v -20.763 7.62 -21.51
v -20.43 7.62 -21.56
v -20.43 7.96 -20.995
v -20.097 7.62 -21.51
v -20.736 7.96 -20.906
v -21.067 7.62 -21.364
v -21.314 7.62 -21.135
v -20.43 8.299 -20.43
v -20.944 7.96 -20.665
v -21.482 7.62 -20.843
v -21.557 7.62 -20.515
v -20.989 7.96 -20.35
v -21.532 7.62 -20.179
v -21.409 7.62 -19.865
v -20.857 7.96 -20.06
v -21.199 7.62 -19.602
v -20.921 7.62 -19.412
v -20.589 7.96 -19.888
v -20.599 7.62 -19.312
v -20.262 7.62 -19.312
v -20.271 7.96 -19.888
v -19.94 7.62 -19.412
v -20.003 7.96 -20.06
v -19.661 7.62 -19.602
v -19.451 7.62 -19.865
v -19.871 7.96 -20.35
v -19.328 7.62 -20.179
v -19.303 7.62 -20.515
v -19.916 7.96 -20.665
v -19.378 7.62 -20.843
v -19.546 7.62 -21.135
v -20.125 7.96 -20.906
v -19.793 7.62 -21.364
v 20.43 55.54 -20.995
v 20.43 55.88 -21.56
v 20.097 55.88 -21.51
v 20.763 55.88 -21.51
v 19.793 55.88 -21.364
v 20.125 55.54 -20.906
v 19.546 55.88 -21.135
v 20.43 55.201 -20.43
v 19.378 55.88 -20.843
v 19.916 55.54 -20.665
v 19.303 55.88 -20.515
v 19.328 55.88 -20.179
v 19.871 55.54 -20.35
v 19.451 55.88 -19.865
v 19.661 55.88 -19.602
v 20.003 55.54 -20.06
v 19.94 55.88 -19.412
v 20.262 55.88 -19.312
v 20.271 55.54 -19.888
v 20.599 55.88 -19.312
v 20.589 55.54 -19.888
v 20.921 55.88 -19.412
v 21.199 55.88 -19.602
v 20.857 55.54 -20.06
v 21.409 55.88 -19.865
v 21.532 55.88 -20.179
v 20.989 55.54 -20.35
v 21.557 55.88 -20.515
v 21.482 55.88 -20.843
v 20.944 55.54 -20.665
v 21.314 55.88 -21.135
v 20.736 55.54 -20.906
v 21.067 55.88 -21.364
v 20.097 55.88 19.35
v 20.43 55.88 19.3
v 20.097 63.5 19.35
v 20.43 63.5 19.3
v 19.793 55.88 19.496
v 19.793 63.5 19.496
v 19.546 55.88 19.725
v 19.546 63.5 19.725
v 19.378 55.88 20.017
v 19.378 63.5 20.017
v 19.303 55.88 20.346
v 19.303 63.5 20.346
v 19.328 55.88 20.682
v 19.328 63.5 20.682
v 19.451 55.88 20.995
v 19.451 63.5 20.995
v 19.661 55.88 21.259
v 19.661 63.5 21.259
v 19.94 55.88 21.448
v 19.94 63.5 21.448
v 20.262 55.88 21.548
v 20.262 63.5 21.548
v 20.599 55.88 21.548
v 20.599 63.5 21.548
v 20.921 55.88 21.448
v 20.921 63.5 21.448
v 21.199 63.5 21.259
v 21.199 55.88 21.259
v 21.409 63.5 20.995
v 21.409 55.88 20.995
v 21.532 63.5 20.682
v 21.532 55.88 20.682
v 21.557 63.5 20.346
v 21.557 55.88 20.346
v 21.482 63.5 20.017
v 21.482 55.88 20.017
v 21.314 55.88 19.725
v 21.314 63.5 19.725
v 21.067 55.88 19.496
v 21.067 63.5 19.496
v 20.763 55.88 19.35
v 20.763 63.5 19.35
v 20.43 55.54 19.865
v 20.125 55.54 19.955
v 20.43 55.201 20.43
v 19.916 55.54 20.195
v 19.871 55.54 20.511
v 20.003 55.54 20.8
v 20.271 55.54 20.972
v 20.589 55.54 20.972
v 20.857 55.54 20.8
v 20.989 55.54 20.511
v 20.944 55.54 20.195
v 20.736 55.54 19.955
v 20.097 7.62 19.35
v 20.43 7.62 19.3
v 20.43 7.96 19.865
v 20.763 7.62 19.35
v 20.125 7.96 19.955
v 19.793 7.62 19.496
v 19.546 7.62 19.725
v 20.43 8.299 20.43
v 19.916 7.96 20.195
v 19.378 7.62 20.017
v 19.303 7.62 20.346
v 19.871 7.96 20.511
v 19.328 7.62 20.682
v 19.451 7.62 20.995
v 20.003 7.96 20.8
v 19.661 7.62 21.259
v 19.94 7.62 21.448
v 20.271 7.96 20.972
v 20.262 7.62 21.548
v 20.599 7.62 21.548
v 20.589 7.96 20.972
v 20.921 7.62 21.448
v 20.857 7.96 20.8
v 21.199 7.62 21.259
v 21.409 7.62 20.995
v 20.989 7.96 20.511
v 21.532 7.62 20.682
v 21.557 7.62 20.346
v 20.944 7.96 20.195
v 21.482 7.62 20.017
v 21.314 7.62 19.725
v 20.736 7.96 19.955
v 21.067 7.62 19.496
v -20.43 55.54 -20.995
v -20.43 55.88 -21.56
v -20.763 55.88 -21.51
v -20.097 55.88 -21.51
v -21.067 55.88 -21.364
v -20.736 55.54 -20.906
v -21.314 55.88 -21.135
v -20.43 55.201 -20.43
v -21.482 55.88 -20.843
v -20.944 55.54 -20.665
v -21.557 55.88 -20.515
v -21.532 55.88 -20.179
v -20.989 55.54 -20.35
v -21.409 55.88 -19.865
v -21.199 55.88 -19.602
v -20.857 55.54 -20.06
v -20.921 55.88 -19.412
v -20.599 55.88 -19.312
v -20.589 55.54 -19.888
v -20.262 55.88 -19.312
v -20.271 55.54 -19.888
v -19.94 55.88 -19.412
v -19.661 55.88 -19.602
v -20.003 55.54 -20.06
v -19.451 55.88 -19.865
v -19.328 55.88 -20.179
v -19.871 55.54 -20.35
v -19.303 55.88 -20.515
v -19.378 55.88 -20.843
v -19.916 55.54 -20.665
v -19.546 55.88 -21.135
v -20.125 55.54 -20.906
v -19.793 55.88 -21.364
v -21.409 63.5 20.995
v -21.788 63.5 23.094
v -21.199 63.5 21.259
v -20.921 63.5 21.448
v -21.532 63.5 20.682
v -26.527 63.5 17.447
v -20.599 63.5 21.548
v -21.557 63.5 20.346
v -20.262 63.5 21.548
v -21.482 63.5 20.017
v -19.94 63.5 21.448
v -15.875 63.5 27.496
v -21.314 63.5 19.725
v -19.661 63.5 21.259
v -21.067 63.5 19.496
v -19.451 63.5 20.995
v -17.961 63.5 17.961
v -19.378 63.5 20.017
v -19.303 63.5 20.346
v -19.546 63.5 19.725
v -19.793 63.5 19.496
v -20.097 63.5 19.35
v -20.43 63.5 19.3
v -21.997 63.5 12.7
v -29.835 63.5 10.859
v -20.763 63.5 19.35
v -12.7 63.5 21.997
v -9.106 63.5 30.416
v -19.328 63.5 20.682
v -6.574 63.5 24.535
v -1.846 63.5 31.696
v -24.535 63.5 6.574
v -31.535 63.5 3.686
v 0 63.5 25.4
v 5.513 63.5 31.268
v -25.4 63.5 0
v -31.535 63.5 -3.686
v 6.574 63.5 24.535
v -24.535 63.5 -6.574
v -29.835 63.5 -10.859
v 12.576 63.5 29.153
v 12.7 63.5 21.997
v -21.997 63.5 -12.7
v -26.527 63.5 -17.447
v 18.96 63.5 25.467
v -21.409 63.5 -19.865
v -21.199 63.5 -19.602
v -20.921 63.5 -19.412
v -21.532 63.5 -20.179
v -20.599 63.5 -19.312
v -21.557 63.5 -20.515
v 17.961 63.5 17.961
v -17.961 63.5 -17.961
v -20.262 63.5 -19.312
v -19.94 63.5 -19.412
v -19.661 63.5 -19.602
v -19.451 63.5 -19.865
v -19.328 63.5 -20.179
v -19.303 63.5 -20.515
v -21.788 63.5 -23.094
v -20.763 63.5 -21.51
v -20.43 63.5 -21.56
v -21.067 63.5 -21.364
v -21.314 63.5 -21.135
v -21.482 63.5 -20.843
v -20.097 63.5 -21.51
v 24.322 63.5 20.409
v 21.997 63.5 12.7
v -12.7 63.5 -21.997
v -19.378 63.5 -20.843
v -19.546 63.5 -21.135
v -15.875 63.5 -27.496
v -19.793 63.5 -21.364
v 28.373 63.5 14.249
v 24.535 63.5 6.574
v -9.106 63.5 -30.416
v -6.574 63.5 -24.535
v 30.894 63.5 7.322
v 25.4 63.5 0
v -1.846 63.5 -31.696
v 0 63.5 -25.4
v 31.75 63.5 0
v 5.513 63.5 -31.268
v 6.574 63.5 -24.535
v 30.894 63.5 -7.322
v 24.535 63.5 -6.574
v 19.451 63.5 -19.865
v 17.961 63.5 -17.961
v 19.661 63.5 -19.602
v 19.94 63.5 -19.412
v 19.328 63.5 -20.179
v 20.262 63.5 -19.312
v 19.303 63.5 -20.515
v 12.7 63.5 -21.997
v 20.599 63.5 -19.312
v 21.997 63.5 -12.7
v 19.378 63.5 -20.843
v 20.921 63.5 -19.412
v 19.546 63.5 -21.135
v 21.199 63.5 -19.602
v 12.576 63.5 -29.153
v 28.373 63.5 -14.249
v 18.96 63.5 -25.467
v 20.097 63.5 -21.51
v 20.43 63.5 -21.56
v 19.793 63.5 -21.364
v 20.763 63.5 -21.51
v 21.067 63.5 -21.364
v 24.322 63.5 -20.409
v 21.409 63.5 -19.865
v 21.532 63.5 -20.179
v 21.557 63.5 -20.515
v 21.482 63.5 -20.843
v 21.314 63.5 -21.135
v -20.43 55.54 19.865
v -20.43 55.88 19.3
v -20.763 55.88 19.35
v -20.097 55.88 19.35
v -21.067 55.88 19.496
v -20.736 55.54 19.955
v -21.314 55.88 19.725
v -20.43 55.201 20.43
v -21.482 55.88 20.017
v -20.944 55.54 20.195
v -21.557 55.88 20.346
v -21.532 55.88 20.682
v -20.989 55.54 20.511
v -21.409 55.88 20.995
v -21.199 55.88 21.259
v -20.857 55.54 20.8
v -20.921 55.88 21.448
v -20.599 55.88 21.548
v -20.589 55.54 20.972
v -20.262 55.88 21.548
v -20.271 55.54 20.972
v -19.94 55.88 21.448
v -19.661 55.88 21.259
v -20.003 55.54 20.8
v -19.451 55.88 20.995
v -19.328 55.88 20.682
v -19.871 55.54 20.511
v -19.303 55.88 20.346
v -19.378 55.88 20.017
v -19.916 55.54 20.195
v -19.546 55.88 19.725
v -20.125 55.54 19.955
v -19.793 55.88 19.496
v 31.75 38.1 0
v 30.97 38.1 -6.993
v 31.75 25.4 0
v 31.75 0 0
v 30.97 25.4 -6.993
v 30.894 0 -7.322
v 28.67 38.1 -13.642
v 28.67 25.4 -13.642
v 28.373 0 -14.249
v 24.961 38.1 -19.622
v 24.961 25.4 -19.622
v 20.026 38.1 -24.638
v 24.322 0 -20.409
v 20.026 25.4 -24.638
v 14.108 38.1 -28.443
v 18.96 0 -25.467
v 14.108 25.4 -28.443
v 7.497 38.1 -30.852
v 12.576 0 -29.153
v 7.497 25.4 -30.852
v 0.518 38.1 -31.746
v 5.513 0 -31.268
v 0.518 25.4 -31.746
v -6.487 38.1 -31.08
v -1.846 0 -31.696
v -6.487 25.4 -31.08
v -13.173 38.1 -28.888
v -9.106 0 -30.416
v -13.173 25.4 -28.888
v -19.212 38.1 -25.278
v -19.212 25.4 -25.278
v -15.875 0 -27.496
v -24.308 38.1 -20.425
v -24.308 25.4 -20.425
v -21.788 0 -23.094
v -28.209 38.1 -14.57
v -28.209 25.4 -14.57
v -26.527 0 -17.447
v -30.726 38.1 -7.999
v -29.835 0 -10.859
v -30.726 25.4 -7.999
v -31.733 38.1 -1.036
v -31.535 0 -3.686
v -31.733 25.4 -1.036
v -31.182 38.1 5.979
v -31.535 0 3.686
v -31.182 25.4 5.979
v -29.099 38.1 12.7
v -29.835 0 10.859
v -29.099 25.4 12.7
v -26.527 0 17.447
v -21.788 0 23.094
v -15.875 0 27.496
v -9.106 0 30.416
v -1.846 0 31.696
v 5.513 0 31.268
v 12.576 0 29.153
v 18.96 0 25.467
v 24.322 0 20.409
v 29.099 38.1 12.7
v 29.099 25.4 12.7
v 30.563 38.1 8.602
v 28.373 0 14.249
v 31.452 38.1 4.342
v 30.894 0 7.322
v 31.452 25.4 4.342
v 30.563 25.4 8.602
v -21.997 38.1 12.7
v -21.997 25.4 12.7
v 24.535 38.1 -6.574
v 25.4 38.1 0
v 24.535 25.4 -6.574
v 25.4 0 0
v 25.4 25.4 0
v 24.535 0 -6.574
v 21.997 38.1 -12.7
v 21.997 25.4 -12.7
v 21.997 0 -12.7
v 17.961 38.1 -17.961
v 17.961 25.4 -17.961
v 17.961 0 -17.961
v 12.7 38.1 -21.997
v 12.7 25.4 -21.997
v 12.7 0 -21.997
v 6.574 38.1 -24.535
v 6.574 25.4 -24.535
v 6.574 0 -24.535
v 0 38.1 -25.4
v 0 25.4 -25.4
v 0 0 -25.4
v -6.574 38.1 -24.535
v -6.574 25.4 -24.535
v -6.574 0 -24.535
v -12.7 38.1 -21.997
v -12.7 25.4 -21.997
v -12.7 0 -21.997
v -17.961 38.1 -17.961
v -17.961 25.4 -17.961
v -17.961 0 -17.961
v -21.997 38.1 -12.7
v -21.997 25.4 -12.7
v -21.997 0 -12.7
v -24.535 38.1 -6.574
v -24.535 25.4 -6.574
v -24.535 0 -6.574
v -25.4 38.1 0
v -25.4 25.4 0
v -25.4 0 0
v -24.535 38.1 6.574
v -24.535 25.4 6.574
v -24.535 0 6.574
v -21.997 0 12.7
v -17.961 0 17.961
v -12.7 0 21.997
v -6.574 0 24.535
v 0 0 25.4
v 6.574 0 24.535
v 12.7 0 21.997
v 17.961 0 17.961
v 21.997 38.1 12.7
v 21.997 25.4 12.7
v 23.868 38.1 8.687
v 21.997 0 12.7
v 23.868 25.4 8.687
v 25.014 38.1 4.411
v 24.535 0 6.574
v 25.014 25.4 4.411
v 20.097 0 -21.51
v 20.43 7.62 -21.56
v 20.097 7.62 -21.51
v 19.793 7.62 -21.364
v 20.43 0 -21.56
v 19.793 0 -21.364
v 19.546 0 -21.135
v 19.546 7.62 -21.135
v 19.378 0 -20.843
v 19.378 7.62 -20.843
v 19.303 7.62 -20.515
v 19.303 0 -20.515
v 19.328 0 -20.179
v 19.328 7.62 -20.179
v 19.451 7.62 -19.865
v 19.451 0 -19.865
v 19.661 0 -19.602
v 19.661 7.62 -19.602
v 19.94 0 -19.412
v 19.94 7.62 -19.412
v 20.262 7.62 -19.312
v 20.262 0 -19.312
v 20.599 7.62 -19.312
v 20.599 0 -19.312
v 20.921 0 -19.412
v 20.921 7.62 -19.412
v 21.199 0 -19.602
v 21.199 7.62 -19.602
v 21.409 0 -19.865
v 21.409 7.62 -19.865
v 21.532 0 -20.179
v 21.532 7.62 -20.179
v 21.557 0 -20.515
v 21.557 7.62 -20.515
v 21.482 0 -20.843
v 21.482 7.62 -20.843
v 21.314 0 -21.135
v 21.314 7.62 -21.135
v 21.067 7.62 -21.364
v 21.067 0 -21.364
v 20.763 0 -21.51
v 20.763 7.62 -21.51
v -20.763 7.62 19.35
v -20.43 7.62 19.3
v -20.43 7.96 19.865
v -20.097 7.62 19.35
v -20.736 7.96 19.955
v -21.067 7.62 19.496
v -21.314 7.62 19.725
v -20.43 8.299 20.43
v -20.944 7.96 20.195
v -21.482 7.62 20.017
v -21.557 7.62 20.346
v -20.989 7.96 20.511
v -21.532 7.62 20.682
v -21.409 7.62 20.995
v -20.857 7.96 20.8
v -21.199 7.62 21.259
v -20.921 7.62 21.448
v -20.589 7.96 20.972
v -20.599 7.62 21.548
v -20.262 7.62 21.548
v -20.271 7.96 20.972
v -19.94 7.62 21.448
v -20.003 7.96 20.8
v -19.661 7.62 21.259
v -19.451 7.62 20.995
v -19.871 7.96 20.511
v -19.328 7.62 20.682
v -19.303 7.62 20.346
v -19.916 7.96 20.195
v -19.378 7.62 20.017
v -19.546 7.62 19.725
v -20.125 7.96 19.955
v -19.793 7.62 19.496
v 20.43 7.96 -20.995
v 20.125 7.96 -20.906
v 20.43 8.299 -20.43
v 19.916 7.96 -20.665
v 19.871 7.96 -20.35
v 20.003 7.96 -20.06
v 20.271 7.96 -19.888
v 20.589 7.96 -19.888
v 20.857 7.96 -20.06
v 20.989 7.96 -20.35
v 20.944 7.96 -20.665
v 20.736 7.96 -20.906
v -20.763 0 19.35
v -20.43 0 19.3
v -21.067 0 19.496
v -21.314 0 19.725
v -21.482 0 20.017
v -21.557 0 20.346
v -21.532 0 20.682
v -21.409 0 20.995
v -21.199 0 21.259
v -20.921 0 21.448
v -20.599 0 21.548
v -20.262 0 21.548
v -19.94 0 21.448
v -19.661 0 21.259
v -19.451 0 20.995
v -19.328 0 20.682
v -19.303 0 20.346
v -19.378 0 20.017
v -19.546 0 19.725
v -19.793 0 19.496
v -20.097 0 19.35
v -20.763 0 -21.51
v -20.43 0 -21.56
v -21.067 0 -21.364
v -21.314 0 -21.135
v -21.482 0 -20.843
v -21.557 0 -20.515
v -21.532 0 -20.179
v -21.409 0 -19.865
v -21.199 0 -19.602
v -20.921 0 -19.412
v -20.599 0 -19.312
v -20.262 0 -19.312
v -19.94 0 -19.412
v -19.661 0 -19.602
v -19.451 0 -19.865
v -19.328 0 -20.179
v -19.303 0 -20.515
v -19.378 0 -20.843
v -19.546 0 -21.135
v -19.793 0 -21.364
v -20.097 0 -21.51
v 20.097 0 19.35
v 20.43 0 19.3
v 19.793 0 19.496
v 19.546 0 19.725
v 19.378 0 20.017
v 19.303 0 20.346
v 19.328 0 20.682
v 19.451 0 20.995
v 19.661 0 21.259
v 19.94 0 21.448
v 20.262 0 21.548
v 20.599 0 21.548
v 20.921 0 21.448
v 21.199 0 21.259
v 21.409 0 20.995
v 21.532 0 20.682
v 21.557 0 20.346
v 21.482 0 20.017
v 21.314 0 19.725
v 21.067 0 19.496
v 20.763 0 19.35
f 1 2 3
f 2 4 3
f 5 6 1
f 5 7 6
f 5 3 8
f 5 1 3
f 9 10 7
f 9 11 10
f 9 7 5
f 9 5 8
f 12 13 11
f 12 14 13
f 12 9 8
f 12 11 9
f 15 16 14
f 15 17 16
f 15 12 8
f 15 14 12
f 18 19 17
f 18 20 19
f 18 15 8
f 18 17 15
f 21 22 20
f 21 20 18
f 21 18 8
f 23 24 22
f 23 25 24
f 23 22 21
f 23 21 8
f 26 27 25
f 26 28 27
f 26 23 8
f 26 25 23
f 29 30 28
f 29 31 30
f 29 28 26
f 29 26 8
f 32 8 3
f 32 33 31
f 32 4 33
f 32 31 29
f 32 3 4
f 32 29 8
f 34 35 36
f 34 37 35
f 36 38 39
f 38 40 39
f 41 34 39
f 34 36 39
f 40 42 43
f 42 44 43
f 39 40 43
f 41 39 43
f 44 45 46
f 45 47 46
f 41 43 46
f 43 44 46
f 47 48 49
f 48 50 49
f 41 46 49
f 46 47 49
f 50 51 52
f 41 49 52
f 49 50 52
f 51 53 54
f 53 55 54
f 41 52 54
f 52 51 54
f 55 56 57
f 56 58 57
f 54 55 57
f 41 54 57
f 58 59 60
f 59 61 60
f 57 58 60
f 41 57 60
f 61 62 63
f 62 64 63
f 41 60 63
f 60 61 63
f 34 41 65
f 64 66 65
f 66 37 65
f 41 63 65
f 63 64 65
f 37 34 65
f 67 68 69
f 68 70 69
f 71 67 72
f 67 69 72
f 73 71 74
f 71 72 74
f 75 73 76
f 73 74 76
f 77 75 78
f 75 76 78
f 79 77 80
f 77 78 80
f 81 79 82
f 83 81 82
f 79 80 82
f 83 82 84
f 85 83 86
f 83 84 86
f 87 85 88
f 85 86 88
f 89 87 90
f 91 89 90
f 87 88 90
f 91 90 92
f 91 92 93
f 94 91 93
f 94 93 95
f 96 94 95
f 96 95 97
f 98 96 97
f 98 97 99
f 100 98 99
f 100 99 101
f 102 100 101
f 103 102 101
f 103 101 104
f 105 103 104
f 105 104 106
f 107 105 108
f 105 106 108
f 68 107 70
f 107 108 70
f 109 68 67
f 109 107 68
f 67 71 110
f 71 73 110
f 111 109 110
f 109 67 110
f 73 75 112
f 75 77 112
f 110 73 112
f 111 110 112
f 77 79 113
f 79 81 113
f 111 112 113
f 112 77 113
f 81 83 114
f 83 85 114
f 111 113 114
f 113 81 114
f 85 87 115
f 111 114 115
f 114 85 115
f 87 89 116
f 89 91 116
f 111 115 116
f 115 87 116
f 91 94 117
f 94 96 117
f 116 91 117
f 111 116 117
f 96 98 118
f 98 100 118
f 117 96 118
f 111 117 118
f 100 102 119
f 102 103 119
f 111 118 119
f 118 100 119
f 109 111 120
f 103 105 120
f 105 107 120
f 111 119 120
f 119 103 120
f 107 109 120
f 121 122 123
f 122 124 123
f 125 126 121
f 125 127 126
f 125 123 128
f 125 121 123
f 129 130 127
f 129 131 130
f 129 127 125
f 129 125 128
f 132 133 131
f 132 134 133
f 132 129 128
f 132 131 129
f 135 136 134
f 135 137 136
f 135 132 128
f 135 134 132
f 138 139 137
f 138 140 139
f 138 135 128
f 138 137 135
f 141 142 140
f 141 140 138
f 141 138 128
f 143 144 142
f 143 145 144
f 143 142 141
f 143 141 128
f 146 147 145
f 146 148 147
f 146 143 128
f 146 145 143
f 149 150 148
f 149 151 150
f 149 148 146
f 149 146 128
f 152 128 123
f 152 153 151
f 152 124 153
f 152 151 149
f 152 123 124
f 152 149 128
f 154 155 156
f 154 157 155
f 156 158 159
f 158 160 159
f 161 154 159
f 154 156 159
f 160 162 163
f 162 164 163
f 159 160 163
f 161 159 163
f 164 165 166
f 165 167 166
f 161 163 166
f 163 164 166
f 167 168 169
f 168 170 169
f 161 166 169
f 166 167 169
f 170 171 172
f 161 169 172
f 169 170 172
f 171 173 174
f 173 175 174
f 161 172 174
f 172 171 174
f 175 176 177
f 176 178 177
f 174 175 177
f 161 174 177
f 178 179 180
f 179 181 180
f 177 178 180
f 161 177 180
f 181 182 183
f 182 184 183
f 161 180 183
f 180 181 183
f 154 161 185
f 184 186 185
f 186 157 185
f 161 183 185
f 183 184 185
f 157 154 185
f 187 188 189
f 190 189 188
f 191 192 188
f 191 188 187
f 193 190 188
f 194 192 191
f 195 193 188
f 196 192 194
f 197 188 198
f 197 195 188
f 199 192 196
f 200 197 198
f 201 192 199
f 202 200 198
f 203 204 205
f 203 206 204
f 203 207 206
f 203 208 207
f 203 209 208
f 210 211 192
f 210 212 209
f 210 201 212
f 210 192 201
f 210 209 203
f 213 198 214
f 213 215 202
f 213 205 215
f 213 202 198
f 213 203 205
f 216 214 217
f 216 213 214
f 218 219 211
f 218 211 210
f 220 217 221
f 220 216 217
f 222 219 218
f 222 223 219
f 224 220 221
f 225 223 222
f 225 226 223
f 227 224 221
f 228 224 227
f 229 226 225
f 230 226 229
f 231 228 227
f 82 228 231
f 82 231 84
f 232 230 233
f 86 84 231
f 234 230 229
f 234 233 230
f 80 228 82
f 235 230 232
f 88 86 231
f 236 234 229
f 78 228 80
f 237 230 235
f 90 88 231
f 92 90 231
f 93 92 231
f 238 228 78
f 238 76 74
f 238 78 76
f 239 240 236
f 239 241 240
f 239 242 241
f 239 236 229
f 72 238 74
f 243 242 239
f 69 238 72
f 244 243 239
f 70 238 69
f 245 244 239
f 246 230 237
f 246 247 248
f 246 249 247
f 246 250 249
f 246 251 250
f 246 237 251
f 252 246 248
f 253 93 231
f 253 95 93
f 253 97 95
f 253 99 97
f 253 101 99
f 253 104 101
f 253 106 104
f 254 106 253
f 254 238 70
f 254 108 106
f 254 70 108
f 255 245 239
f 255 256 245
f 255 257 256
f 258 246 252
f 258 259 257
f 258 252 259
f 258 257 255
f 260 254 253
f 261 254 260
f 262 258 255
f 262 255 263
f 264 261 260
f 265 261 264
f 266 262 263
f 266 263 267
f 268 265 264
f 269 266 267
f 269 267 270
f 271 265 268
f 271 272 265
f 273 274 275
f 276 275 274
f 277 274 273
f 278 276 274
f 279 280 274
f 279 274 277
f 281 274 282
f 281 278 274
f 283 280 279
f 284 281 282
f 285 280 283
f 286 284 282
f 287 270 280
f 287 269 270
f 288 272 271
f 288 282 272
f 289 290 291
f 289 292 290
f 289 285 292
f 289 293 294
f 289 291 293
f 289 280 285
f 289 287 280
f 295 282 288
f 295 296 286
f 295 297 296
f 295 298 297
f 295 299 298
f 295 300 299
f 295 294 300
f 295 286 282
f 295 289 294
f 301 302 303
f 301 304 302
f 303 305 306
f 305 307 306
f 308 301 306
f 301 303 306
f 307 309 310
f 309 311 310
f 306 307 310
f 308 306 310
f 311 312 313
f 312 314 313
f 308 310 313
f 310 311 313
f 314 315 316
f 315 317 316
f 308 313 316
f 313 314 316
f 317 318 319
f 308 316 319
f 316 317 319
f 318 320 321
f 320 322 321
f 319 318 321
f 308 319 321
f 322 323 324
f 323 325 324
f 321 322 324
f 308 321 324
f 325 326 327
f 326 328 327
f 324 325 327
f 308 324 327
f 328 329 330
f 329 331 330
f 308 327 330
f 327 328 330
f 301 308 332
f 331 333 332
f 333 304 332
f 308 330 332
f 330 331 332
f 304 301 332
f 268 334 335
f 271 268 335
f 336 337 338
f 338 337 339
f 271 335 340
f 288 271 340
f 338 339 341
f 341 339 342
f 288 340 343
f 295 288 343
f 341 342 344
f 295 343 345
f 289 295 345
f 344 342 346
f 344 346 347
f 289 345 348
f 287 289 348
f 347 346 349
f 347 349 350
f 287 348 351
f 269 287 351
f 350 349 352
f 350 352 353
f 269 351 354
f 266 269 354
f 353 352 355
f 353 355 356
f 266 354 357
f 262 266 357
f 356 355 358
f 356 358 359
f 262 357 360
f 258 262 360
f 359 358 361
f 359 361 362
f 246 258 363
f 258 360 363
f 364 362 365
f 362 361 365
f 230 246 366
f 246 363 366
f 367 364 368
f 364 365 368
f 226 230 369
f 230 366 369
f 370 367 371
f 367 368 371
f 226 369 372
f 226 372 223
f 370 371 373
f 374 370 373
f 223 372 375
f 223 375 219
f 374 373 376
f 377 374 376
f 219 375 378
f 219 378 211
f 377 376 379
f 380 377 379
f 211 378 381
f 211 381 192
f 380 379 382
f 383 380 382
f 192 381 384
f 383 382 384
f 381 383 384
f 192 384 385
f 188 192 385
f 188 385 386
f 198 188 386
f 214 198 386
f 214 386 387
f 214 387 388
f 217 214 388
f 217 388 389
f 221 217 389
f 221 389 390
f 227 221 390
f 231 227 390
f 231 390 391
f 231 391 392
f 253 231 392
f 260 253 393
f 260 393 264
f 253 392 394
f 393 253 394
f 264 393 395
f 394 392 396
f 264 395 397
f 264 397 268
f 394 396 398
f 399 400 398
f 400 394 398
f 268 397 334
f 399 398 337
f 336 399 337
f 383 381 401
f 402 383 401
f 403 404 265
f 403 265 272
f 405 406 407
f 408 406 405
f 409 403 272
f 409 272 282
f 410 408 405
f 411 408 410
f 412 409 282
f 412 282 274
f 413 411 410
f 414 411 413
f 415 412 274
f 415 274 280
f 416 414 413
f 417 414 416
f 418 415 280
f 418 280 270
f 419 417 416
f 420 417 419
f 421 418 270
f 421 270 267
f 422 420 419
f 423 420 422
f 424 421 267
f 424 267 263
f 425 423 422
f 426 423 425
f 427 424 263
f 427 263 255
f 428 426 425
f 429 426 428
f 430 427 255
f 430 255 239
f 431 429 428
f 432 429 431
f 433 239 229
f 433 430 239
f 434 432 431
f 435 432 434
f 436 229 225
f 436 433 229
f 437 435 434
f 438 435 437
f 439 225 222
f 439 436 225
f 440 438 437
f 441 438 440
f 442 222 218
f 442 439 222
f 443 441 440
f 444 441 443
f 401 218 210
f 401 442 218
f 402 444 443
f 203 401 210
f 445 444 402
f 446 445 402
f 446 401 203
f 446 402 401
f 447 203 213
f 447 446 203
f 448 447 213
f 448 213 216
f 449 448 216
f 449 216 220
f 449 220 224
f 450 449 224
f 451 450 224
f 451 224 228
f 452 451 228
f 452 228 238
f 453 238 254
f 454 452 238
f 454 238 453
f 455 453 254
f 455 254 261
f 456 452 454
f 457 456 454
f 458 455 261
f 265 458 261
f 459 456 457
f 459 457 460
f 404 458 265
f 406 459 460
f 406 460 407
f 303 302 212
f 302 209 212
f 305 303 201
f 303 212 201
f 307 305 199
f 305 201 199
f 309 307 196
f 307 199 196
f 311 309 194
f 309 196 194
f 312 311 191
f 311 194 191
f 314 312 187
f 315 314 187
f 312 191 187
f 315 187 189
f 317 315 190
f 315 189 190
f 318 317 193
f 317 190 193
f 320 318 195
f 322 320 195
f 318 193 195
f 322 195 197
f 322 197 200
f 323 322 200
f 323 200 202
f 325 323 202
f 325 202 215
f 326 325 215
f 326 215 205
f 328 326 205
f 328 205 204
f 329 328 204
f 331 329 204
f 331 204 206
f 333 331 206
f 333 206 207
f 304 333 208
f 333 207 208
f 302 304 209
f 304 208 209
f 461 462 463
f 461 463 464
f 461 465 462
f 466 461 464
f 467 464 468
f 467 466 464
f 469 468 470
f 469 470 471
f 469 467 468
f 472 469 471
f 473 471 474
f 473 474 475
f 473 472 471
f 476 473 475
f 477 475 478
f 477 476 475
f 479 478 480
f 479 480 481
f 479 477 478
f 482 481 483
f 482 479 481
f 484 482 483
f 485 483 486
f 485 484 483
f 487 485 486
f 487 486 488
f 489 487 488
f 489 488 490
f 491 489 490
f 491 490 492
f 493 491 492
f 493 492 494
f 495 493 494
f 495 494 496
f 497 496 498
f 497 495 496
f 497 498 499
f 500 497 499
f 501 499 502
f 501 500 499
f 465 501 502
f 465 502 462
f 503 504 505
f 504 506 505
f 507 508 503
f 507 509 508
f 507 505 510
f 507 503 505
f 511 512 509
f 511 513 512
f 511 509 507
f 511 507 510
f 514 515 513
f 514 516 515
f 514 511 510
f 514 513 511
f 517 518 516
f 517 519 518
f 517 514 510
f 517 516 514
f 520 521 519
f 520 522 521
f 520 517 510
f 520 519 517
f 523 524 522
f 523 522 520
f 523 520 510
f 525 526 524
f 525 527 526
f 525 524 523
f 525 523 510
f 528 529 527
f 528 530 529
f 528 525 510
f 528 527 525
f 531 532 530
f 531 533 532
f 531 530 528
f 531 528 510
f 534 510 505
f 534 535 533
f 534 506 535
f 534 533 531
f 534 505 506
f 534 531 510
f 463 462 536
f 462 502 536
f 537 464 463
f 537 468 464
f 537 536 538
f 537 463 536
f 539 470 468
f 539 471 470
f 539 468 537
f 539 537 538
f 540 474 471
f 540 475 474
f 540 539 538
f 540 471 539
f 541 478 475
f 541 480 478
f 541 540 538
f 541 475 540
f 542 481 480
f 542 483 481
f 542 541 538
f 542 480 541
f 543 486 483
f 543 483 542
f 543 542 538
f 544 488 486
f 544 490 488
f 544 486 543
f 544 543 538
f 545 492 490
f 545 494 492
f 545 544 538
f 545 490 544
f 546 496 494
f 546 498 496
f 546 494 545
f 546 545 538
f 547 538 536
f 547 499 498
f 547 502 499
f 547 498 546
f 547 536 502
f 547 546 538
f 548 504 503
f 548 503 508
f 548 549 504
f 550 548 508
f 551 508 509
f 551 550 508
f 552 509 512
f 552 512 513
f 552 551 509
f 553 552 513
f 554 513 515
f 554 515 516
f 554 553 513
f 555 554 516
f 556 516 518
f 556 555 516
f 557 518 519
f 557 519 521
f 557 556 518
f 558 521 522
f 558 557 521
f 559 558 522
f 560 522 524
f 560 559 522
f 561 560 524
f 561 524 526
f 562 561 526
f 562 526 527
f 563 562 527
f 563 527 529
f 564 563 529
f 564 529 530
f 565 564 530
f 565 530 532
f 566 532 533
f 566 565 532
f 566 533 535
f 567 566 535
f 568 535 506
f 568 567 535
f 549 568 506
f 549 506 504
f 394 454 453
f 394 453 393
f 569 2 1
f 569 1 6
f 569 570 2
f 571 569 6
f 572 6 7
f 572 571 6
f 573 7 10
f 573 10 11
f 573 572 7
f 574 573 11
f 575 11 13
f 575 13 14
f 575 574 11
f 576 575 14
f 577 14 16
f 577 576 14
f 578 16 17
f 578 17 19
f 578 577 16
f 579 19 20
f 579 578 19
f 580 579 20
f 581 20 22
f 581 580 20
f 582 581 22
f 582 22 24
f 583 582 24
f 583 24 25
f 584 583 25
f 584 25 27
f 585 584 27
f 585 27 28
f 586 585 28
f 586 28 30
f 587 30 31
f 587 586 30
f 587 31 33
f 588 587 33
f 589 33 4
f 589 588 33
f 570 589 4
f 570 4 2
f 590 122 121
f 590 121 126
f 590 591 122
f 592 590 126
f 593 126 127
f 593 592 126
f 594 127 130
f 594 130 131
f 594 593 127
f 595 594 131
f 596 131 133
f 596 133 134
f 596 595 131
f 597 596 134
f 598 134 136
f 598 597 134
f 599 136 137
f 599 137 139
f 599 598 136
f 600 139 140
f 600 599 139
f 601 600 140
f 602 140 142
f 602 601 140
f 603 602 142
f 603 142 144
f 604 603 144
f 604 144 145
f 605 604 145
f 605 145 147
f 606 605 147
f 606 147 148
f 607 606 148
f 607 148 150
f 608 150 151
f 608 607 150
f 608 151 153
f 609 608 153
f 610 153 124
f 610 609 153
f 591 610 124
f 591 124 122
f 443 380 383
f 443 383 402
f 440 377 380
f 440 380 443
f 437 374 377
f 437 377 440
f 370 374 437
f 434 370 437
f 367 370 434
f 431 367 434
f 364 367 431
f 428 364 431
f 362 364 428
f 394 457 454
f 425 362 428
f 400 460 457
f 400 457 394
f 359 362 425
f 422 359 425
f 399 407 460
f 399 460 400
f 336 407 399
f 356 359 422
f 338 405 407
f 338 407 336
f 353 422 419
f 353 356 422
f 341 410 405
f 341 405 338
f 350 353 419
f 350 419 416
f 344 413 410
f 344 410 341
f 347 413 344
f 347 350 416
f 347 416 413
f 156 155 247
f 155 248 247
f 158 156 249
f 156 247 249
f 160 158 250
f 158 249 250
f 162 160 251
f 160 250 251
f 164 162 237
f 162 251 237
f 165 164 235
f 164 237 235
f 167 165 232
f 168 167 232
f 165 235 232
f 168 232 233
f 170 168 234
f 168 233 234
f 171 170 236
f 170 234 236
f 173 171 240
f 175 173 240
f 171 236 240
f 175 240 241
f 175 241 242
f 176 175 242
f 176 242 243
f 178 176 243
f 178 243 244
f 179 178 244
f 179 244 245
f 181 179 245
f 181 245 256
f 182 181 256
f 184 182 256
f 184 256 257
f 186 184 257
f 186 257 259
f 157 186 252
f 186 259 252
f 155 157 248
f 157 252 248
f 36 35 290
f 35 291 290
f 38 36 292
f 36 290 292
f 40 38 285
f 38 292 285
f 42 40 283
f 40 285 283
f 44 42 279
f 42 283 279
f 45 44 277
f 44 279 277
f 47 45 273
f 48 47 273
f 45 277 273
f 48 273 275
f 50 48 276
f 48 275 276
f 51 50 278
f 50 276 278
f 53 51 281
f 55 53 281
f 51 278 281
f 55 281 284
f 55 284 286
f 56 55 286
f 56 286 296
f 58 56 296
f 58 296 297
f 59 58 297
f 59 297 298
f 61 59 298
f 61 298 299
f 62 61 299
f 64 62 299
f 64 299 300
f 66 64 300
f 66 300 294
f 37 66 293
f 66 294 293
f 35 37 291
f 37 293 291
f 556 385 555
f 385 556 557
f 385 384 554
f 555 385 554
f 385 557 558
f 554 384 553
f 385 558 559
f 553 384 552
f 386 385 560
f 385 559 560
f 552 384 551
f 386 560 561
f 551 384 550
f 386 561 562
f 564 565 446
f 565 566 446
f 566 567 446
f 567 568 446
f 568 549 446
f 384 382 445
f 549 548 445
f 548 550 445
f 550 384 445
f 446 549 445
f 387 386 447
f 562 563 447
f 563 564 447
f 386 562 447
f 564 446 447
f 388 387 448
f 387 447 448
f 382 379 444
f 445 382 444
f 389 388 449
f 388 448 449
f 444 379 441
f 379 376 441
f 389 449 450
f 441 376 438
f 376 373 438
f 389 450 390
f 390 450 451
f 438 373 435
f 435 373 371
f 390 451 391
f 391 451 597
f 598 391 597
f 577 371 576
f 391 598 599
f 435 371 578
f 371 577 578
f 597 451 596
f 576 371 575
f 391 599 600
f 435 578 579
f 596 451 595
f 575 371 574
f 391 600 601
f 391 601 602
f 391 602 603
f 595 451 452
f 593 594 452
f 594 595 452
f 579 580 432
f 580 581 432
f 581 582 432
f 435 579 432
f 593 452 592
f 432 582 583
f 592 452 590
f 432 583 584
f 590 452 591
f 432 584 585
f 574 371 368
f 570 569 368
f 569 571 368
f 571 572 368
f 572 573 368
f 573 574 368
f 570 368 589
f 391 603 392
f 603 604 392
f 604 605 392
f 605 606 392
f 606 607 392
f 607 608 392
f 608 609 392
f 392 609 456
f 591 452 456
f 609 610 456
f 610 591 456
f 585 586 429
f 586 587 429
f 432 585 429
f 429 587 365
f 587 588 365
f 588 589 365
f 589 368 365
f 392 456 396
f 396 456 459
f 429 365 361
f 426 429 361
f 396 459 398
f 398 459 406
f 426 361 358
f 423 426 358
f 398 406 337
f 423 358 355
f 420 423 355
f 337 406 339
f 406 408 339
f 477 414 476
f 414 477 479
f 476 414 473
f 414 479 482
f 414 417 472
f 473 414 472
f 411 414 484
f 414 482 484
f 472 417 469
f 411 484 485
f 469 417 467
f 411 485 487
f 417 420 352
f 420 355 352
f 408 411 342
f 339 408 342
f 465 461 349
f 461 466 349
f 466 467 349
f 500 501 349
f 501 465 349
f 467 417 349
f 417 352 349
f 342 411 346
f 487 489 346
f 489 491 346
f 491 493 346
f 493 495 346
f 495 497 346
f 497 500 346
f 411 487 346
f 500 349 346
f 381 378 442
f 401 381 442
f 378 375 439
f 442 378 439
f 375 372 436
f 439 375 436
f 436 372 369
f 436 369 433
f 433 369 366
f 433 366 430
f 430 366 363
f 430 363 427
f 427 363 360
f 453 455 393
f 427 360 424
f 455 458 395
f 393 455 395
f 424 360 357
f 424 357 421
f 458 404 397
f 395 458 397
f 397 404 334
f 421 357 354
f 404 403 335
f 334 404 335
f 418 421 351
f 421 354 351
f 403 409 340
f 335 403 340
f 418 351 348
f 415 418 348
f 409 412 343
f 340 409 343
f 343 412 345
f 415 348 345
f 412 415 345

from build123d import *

# Parameters (mm, degrees)
SKETCH1_R                      = 31.75
SKETCH1_R_2                    = 25.4
BOSS_EXTRUDE1_DEPTH            = 63.5
F_4_40_TAPPED_HOLE1_AT_2_COUNT = 2
F_4_40_TAPPED_HOLE1_AT_2_PITCH = 40.860165351
F_4_40_TAPPED_HOLE1_AT_3_COUNT = 2
F_4_40_TAPPED_HOLE1_AT_3_PITCH = 57.785
F_4_40_TAPPED_HOLE1_AT_4_COUNT = 2
F_4_40_TAPPED_HOLE1_AT_4_PITCH = 40.860165351
SKETCH4_W                      = 112.670227293
SKETCH4_H                      = 56.447090519
CUT_EXTRUDE1_DEPTH             = 12.7


with BuildPart() as part:
    # Sketch1 → Boss-Extrude1 (new body)
    with BuildSketch(Plane(origin=(0, 0, 0), x_dir=(1, 0, 0), z_dir=(0, 1, 0))):
        Circle(SKETCH1_R)
        Circle(SKETCH1_R_2, mode=Mode.SUBTRACT)
    extrude(amount=BOSS_EXTRUDE1_DEPTH)

    # Sketch2 → #4-40 Tapped Hole1 (revolve, cut)
    with BuildSketch(Plane(origin=(-20.430082675, 0, 20.430082675), x_dir=(0, 0, -1), z_dir=(1, 0, 0))):
        Polygon((0, 0), (0, 8.299152758), (1.1303, 7.62), (1.1303, 0), align=None)
    f_4_40_tapped_hole1 = revolve(axis=Axis((-20.430082675, -6.35, 20.430082675), (0, 1, 0)), mode=Mode.SUBTRACT)

    # #4-40 Tapped Hole1 at 2: #4-40 Tapped Hole1 ×2
    with Locations(*[(i * F_4_40_TAPPED_HOLE1_AT_2_PITCH, 0, 0) for i in range(1, F_4_40_TAPPED_HOLE1_AT_2_COUNT)]):
        add(f_4_40_tapped_hole1, mode=Mode.SUBTRACT)

    # #4-40 Tapped Hole1 at 3: #4-40 Tapped Hole1 ×2
    with Locations(*[Vector(0.707106781, 0, -0.707106781) * (i * F_4_40_TAPPED_HOLE1_AT_3_PITCH) for i in range(1, F_4_40_TAPPED_HOLE1_AT_3_COUNT)]):
        add(f_4_40_tapped_hole1, mode=Mode.SUBTRACT)

    # #4-40 Tapped Hole1 at 4: #4-40 Tapped Hole1 ×2
    with Locations(*[(0, 0, -i * F_4_40_TAPPED_HOLE1_AT_4_PITCH) for i in range(1, F_4_40_TAPPED_HOLE1_AT_4_COUNT)]):
        add(f_4_40_tapped_hole1, mode=Mode.SUBTRACT)

    # Sketch4 → Cut-Extrude1 (cut)
    with BuildSketch(Plane(origin=(0, 25.4, 0), x_dir=(1, 0, 0), z_dir=(0, 1, 0))):
        with Locations((1.62115564, 15.52354526)):
            Rectangle(SKETCH4_W, SKETCH4_H)
    extrude(amount=CUT_EXTRUDE1_DEPTH, mode=Mode.SUBTRACT)

    # Mirror1: #4-40 Tapped Hole1 across plane
    add(f_4_40_tapped_hole1.mirror(Plane.ZX.offset(31.75)), mode=Mode.SUBTRACT)

    # Mirror1 copy 1 sketch → Mirror1 copy 1 (revolve, cut)
    with BuildSketch(Plane(origin=(20.430082675, 63.5, 20.430082675), x_dir=(0, 0, -1), z_dir=(1, 0, 0))):
        Polygon((0, 0), (0, -8.299152758), (1.1303, -7.62), (1.1303, 0), align=None)
    revolve(axis=Axis((20.430082675, 69.85, 20.430082675), (0, 1, 0)), mode=Mode.SUBTRACT)

    # Mirror1 copy 2 sketch → Mirror1 copy 2 (revolve, cut)
    with BuildSketch(Plane(origin=(20.430082675, 63.5, -20.430082675), x_dir=(0, 0, -1), z_dir=(1, 0, 0))):
        Polygon((0, 0), (0, -8.299152758), (1.1303, -7.62), (1.1303, 0), align=None)
    revolve(axis=Axis((20.430082675, 69.85, -20.430082675), (0, 1, 0)), mode=Mode.SUBTRACT)

    # Mirror1 copy 3 sketch → Mirror1 copy 3 (revolve, cut)
    with BuildSketch(Plane(origin=(-20.430082675, 63.5, -20.430082675), x_dir=(0, 0, -1), z_dir=(1, 0, 0))):
        Polygon((0, 0), (0, -8.299152758), (1.1303, -7.62), (1.1303, 0), align=None)
    revolve(axis=Axis((-20.430082675, 69.85, -20.430082675), (0, 1, 0)), mode=Mode.SUBTRACT)


solid = part.part
